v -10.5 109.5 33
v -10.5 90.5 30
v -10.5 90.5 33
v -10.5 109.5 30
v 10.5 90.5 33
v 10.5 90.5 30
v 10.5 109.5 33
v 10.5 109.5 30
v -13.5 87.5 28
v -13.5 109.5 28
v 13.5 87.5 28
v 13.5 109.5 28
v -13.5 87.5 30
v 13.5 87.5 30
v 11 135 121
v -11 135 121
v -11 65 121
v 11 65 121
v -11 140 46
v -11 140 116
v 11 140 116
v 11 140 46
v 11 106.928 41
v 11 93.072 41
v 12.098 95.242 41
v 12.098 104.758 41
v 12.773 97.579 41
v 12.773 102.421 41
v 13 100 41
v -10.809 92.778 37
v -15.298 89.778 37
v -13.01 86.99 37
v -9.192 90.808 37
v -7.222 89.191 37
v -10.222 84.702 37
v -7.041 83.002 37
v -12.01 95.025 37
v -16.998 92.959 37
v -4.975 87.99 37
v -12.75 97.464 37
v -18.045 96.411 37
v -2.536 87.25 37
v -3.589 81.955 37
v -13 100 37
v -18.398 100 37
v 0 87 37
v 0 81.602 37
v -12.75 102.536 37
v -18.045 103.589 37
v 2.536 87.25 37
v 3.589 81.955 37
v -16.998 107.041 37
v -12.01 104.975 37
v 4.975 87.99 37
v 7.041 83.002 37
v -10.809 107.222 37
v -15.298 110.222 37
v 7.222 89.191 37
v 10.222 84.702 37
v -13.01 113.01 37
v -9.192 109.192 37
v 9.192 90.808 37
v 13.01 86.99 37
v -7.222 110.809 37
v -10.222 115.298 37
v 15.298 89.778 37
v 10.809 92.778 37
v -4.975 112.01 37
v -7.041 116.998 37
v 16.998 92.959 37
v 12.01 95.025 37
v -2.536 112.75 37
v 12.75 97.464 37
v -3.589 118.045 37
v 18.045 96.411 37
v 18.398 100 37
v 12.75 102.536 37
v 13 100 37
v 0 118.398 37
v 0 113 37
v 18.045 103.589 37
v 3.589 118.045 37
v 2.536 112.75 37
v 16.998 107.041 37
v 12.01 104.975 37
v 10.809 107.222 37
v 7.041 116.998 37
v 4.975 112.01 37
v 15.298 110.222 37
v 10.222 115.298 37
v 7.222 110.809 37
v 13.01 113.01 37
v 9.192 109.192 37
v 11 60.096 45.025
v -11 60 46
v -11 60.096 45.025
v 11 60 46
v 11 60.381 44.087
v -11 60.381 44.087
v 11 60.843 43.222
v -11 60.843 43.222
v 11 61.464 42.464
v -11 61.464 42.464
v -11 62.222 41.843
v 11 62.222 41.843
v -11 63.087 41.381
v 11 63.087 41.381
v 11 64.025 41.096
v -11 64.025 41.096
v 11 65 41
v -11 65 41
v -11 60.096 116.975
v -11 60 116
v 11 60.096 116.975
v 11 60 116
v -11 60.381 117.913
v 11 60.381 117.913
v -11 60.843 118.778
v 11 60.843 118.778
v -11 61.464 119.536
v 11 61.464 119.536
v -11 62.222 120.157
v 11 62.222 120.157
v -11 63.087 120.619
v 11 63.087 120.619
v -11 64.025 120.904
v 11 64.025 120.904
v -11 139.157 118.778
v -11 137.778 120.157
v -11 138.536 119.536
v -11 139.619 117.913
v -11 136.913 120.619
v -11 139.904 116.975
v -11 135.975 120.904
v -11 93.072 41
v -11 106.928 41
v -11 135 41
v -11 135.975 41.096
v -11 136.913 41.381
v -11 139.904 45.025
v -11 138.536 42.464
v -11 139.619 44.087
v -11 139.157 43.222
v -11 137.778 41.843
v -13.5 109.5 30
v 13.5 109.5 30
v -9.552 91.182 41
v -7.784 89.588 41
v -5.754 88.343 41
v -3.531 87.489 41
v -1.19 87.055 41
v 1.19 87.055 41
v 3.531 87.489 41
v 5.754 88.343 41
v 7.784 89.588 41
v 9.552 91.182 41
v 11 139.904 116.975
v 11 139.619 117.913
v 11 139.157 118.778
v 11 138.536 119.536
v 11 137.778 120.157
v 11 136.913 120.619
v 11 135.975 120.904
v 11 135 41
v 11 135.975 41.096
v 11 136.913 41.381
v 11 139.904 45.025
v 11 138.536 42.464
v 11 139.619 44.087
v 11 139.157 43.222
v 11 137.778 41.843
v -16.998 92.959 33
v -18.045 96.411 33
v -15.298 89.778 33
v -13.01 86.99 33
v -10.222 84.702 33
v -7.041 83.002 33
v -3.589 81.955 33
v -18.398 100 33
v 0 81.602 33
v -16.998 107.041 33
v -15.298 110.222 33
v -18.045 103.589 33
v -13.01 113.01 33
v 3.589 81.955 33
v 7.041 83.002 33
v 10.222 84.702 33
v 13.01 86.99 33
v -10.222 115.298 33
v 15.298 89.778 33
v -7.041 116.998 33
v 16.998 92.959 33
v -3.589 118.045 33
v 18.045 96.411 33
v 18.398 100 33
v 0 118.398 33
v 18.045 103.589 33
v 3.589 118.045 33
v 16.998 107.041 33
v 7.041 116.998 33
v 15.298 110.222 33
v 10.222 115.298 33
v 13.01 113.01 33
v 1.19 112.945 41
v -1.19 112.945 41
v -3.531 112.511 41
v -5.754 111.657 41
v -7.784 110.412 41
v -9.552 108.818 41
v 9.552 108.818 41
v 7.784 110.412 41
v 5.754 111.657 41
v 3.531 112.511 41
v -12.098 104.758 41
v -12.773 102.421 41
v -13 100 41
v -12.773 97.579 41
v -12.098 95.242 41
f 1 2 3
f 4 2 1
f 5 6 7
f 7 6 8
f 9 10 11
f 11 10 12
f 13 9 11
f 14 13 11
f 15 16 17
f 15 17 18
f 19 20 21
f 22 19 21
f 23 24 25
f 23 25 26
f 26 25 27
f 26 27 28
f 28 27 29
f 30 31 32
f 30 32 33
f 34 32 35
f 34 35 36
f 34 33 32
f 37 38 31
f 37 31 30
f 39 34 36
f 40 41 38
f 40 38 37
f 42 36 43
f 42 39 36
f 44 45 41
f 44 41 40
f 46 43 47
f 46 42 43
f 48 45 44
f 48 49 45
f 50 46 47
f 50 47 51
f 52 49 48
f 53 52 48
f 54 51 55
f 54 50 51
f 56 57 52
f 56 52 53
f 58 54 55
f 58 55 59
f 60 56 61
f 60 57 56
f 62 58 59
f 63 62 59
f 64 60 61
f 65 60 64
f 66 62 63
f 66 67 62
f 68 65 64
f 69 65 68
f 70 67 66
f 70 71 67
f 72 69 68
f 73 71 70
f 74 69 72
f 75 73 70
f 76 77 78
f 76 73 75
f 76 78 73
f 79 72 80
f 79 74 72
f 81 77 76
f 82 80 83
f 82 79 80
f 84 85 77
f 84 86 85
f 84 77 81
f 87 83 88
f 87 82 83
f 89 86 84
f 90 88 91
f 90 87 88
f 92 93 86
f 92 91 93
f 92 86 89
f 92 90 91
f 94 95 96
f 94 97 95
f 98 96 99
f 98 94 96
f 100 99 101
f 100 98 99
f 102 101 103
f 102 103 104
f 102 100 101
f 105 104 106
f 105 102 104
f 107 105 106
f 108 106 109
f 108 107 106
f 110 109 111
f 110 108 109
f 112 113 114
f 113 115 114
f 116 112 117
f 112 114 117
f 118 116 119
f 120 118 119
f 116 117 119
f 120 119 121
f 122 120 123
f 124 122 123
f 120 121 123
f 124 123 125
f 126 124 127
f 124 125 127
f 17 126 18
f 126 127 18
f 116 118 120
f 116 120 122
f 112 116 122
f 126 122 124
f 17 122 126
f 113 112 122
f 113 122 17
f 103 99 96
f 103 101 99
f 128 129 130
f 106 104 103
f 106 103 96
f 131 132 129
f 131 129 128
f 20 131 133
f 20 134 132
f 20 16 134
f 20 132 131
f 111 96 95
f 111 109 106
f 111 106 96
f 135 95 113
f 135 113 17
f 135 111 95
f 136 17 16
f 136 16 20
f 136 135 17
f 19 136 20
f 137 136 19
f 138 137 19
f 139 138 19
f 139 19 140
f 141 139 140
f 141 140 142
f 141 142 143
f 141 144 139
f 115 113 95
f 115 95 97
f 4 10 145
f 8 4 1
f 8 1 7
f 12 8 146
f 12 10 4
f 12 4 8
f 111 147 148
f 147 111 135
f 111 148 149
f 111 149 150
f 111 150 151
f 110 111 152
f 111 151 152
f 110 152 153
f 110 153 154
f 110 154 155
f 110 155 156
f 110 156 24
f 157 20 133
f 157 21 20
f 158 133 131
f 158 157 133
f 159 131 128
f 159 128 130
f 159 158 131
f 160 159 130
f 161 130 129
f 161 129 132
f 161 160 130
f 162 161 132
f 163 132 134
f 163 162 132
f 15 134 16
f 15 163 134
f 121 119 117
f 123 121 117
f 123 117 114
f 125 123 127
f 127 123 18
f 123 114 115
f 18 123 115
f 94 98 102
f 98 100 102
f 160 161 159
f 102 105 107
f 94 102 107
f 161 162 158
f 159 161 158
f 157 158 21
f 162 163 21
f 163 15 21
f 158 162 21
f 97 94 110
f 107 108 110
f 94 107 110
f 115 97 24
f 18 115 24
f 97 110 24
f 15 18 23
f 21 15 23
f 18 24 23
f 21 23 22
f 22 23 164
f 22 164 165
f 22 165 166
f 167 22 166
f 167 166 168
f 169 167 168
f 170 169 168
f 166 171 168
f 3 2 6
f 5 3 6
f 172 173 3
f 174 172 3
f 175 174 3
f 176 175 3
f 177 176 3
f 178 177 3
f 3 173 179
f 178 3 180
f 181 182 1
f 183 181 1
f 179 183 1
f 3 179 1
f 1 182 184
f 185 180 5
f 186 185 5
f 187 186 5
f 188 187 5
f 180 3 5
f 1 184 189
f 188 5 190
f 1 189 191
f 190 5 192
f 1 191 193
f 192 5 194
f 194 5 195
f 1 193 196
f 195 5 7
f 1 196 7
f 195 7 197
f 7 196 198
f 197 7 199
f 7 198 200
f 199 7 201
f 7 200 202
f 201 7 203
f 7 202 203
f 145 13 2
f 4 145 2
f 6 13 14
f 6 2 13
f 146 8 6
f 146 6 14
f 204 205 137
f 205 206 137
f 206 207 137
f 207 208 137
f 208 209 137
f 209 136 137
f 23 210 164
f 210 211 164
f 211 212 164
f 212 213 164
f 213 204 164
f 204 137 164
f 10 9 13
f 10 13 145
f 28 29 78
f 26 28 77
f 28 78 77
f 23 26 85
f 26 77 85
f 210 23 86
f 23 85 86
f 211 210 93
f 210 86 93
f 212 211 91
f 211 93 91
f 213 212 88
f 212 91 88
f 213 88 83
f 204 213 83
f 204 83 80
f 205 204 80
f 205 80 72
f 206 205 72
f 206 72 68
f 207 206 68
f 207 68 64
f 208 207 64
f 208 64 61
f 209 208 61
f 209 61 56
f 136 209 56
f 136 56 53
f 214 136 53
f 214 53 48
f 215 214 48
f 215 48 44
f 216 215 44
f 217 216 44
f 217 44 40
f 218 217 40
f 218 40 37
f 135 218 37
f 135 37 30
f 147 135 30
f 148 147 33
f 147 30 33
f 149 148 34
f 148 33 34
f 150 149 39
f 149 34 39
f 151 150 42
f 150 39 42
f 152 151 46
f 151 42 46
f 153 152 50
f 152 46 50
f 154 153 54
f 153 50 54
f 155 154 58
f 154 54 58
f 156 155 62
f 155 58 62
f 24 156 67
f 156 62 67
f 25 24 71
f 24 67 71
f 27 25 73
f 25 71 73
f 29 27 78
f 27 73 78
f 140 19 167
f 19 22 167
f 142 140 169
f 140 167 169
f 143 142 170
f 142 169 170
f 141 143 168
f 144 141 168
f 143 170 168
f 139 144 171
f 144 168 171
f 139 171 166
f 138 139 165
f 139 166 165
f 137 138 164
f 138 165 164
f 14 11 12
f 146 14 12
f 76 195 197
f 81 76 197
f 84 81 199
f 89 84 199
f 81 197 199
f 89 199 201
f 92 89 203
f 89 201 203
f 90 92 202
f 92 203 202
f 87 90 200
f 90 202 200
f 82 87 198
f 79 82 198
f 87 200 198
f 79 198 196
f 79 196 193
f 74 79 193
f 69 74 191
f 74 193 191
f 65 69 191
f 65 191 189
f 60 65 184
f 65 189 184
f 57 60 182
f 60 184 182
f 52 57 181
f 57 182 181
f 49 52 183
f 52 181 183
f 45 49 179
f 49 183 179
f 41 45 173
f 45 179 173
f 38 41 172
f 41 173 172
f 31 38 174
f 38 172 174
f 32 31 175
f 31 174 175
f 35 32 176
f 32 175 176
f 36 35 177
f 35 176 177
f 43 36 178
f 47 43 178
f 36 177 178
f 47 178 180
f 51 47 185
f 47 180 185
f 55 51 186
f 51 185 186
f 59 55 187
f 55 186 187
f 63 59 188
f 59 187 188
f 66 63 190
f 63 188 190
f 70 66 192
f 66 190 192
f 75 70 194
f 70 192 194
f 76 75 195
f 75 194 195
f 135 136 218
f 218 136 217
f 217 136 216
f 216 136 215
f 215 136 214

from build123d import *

# Parameters (mm, degrees)
SKETCH030_W  = 27
SKETCH030_H  = 22
PAD020_DEPTH = 2
SKETCH031_W  = 21
SKETCH031_H  = 19
PAD021_DEPTH = 3
SKETCH032_R  = 18.398369
PAD022_DEPTH = 4
SKETCH033_R  = 13
PAD023_DEPTH = 4
SKETCH034_W  = 22
SKETCH034_H  = 80
PAD024_DEPTH = 80
FILLET_R     = 5


with BuildPart() as part:
    # Sketch030 → Pad020 (new body)
    with BuildSketch(Plane.XY):
        with Locations((0, -1.5)):
            Rectangle(SKETCH030_W, SKETCH030_H)
    extrude(amount=PAD020_DEPTH)

    # Sketch031 (on Face6 of Pad020) → Pad021 (join)
    with BuildSketch(Plane.XY.offset(2)):
        Rectangle(SKETCH031_W, SKETCH031_H)
    extrude(amount=PAD021_DEPTH)

    # Sketch032 (on Face11 of Pad021) → Pad022 (join)
    with BuildSketch(Plane.XY.offset(5)):
        Circle(SKETCH032_R)
    extrude(amount=PAD022_DEPTH)

    # Sketch033 (on Face3 of Pad022) → Pad023 (join)
    with BuildSketch(Plane.XY.offset(9)):
        Circle(SKETCH033_R)
    extrude(amount=PAD023_DEPTH)

    # Sketch034 (on Face11 of Pad023) → Pad024 (join)
    with BuildSketch(Plane.XY.offset(13)):
        Rectangle(SKETCH034_W, SKETCH034_H)
    extrude(amount=PAD024_DEPTH)

    # Fillet
    fillet_edges = [part.edges().sort_by_distance(p)[0] for p in [
        (0, -40, 93),
        (0, 40, 93),
        (0, -40, 13),
        (0, 40, 13),
    ]]
    fillet(fillet_edges, radius=FILLET_R)


with BuildPart() as part_1:
    # Body013 placement: moved
    add(part.part.moved(Location((0, 100, 28))))


solid = part_1.part
